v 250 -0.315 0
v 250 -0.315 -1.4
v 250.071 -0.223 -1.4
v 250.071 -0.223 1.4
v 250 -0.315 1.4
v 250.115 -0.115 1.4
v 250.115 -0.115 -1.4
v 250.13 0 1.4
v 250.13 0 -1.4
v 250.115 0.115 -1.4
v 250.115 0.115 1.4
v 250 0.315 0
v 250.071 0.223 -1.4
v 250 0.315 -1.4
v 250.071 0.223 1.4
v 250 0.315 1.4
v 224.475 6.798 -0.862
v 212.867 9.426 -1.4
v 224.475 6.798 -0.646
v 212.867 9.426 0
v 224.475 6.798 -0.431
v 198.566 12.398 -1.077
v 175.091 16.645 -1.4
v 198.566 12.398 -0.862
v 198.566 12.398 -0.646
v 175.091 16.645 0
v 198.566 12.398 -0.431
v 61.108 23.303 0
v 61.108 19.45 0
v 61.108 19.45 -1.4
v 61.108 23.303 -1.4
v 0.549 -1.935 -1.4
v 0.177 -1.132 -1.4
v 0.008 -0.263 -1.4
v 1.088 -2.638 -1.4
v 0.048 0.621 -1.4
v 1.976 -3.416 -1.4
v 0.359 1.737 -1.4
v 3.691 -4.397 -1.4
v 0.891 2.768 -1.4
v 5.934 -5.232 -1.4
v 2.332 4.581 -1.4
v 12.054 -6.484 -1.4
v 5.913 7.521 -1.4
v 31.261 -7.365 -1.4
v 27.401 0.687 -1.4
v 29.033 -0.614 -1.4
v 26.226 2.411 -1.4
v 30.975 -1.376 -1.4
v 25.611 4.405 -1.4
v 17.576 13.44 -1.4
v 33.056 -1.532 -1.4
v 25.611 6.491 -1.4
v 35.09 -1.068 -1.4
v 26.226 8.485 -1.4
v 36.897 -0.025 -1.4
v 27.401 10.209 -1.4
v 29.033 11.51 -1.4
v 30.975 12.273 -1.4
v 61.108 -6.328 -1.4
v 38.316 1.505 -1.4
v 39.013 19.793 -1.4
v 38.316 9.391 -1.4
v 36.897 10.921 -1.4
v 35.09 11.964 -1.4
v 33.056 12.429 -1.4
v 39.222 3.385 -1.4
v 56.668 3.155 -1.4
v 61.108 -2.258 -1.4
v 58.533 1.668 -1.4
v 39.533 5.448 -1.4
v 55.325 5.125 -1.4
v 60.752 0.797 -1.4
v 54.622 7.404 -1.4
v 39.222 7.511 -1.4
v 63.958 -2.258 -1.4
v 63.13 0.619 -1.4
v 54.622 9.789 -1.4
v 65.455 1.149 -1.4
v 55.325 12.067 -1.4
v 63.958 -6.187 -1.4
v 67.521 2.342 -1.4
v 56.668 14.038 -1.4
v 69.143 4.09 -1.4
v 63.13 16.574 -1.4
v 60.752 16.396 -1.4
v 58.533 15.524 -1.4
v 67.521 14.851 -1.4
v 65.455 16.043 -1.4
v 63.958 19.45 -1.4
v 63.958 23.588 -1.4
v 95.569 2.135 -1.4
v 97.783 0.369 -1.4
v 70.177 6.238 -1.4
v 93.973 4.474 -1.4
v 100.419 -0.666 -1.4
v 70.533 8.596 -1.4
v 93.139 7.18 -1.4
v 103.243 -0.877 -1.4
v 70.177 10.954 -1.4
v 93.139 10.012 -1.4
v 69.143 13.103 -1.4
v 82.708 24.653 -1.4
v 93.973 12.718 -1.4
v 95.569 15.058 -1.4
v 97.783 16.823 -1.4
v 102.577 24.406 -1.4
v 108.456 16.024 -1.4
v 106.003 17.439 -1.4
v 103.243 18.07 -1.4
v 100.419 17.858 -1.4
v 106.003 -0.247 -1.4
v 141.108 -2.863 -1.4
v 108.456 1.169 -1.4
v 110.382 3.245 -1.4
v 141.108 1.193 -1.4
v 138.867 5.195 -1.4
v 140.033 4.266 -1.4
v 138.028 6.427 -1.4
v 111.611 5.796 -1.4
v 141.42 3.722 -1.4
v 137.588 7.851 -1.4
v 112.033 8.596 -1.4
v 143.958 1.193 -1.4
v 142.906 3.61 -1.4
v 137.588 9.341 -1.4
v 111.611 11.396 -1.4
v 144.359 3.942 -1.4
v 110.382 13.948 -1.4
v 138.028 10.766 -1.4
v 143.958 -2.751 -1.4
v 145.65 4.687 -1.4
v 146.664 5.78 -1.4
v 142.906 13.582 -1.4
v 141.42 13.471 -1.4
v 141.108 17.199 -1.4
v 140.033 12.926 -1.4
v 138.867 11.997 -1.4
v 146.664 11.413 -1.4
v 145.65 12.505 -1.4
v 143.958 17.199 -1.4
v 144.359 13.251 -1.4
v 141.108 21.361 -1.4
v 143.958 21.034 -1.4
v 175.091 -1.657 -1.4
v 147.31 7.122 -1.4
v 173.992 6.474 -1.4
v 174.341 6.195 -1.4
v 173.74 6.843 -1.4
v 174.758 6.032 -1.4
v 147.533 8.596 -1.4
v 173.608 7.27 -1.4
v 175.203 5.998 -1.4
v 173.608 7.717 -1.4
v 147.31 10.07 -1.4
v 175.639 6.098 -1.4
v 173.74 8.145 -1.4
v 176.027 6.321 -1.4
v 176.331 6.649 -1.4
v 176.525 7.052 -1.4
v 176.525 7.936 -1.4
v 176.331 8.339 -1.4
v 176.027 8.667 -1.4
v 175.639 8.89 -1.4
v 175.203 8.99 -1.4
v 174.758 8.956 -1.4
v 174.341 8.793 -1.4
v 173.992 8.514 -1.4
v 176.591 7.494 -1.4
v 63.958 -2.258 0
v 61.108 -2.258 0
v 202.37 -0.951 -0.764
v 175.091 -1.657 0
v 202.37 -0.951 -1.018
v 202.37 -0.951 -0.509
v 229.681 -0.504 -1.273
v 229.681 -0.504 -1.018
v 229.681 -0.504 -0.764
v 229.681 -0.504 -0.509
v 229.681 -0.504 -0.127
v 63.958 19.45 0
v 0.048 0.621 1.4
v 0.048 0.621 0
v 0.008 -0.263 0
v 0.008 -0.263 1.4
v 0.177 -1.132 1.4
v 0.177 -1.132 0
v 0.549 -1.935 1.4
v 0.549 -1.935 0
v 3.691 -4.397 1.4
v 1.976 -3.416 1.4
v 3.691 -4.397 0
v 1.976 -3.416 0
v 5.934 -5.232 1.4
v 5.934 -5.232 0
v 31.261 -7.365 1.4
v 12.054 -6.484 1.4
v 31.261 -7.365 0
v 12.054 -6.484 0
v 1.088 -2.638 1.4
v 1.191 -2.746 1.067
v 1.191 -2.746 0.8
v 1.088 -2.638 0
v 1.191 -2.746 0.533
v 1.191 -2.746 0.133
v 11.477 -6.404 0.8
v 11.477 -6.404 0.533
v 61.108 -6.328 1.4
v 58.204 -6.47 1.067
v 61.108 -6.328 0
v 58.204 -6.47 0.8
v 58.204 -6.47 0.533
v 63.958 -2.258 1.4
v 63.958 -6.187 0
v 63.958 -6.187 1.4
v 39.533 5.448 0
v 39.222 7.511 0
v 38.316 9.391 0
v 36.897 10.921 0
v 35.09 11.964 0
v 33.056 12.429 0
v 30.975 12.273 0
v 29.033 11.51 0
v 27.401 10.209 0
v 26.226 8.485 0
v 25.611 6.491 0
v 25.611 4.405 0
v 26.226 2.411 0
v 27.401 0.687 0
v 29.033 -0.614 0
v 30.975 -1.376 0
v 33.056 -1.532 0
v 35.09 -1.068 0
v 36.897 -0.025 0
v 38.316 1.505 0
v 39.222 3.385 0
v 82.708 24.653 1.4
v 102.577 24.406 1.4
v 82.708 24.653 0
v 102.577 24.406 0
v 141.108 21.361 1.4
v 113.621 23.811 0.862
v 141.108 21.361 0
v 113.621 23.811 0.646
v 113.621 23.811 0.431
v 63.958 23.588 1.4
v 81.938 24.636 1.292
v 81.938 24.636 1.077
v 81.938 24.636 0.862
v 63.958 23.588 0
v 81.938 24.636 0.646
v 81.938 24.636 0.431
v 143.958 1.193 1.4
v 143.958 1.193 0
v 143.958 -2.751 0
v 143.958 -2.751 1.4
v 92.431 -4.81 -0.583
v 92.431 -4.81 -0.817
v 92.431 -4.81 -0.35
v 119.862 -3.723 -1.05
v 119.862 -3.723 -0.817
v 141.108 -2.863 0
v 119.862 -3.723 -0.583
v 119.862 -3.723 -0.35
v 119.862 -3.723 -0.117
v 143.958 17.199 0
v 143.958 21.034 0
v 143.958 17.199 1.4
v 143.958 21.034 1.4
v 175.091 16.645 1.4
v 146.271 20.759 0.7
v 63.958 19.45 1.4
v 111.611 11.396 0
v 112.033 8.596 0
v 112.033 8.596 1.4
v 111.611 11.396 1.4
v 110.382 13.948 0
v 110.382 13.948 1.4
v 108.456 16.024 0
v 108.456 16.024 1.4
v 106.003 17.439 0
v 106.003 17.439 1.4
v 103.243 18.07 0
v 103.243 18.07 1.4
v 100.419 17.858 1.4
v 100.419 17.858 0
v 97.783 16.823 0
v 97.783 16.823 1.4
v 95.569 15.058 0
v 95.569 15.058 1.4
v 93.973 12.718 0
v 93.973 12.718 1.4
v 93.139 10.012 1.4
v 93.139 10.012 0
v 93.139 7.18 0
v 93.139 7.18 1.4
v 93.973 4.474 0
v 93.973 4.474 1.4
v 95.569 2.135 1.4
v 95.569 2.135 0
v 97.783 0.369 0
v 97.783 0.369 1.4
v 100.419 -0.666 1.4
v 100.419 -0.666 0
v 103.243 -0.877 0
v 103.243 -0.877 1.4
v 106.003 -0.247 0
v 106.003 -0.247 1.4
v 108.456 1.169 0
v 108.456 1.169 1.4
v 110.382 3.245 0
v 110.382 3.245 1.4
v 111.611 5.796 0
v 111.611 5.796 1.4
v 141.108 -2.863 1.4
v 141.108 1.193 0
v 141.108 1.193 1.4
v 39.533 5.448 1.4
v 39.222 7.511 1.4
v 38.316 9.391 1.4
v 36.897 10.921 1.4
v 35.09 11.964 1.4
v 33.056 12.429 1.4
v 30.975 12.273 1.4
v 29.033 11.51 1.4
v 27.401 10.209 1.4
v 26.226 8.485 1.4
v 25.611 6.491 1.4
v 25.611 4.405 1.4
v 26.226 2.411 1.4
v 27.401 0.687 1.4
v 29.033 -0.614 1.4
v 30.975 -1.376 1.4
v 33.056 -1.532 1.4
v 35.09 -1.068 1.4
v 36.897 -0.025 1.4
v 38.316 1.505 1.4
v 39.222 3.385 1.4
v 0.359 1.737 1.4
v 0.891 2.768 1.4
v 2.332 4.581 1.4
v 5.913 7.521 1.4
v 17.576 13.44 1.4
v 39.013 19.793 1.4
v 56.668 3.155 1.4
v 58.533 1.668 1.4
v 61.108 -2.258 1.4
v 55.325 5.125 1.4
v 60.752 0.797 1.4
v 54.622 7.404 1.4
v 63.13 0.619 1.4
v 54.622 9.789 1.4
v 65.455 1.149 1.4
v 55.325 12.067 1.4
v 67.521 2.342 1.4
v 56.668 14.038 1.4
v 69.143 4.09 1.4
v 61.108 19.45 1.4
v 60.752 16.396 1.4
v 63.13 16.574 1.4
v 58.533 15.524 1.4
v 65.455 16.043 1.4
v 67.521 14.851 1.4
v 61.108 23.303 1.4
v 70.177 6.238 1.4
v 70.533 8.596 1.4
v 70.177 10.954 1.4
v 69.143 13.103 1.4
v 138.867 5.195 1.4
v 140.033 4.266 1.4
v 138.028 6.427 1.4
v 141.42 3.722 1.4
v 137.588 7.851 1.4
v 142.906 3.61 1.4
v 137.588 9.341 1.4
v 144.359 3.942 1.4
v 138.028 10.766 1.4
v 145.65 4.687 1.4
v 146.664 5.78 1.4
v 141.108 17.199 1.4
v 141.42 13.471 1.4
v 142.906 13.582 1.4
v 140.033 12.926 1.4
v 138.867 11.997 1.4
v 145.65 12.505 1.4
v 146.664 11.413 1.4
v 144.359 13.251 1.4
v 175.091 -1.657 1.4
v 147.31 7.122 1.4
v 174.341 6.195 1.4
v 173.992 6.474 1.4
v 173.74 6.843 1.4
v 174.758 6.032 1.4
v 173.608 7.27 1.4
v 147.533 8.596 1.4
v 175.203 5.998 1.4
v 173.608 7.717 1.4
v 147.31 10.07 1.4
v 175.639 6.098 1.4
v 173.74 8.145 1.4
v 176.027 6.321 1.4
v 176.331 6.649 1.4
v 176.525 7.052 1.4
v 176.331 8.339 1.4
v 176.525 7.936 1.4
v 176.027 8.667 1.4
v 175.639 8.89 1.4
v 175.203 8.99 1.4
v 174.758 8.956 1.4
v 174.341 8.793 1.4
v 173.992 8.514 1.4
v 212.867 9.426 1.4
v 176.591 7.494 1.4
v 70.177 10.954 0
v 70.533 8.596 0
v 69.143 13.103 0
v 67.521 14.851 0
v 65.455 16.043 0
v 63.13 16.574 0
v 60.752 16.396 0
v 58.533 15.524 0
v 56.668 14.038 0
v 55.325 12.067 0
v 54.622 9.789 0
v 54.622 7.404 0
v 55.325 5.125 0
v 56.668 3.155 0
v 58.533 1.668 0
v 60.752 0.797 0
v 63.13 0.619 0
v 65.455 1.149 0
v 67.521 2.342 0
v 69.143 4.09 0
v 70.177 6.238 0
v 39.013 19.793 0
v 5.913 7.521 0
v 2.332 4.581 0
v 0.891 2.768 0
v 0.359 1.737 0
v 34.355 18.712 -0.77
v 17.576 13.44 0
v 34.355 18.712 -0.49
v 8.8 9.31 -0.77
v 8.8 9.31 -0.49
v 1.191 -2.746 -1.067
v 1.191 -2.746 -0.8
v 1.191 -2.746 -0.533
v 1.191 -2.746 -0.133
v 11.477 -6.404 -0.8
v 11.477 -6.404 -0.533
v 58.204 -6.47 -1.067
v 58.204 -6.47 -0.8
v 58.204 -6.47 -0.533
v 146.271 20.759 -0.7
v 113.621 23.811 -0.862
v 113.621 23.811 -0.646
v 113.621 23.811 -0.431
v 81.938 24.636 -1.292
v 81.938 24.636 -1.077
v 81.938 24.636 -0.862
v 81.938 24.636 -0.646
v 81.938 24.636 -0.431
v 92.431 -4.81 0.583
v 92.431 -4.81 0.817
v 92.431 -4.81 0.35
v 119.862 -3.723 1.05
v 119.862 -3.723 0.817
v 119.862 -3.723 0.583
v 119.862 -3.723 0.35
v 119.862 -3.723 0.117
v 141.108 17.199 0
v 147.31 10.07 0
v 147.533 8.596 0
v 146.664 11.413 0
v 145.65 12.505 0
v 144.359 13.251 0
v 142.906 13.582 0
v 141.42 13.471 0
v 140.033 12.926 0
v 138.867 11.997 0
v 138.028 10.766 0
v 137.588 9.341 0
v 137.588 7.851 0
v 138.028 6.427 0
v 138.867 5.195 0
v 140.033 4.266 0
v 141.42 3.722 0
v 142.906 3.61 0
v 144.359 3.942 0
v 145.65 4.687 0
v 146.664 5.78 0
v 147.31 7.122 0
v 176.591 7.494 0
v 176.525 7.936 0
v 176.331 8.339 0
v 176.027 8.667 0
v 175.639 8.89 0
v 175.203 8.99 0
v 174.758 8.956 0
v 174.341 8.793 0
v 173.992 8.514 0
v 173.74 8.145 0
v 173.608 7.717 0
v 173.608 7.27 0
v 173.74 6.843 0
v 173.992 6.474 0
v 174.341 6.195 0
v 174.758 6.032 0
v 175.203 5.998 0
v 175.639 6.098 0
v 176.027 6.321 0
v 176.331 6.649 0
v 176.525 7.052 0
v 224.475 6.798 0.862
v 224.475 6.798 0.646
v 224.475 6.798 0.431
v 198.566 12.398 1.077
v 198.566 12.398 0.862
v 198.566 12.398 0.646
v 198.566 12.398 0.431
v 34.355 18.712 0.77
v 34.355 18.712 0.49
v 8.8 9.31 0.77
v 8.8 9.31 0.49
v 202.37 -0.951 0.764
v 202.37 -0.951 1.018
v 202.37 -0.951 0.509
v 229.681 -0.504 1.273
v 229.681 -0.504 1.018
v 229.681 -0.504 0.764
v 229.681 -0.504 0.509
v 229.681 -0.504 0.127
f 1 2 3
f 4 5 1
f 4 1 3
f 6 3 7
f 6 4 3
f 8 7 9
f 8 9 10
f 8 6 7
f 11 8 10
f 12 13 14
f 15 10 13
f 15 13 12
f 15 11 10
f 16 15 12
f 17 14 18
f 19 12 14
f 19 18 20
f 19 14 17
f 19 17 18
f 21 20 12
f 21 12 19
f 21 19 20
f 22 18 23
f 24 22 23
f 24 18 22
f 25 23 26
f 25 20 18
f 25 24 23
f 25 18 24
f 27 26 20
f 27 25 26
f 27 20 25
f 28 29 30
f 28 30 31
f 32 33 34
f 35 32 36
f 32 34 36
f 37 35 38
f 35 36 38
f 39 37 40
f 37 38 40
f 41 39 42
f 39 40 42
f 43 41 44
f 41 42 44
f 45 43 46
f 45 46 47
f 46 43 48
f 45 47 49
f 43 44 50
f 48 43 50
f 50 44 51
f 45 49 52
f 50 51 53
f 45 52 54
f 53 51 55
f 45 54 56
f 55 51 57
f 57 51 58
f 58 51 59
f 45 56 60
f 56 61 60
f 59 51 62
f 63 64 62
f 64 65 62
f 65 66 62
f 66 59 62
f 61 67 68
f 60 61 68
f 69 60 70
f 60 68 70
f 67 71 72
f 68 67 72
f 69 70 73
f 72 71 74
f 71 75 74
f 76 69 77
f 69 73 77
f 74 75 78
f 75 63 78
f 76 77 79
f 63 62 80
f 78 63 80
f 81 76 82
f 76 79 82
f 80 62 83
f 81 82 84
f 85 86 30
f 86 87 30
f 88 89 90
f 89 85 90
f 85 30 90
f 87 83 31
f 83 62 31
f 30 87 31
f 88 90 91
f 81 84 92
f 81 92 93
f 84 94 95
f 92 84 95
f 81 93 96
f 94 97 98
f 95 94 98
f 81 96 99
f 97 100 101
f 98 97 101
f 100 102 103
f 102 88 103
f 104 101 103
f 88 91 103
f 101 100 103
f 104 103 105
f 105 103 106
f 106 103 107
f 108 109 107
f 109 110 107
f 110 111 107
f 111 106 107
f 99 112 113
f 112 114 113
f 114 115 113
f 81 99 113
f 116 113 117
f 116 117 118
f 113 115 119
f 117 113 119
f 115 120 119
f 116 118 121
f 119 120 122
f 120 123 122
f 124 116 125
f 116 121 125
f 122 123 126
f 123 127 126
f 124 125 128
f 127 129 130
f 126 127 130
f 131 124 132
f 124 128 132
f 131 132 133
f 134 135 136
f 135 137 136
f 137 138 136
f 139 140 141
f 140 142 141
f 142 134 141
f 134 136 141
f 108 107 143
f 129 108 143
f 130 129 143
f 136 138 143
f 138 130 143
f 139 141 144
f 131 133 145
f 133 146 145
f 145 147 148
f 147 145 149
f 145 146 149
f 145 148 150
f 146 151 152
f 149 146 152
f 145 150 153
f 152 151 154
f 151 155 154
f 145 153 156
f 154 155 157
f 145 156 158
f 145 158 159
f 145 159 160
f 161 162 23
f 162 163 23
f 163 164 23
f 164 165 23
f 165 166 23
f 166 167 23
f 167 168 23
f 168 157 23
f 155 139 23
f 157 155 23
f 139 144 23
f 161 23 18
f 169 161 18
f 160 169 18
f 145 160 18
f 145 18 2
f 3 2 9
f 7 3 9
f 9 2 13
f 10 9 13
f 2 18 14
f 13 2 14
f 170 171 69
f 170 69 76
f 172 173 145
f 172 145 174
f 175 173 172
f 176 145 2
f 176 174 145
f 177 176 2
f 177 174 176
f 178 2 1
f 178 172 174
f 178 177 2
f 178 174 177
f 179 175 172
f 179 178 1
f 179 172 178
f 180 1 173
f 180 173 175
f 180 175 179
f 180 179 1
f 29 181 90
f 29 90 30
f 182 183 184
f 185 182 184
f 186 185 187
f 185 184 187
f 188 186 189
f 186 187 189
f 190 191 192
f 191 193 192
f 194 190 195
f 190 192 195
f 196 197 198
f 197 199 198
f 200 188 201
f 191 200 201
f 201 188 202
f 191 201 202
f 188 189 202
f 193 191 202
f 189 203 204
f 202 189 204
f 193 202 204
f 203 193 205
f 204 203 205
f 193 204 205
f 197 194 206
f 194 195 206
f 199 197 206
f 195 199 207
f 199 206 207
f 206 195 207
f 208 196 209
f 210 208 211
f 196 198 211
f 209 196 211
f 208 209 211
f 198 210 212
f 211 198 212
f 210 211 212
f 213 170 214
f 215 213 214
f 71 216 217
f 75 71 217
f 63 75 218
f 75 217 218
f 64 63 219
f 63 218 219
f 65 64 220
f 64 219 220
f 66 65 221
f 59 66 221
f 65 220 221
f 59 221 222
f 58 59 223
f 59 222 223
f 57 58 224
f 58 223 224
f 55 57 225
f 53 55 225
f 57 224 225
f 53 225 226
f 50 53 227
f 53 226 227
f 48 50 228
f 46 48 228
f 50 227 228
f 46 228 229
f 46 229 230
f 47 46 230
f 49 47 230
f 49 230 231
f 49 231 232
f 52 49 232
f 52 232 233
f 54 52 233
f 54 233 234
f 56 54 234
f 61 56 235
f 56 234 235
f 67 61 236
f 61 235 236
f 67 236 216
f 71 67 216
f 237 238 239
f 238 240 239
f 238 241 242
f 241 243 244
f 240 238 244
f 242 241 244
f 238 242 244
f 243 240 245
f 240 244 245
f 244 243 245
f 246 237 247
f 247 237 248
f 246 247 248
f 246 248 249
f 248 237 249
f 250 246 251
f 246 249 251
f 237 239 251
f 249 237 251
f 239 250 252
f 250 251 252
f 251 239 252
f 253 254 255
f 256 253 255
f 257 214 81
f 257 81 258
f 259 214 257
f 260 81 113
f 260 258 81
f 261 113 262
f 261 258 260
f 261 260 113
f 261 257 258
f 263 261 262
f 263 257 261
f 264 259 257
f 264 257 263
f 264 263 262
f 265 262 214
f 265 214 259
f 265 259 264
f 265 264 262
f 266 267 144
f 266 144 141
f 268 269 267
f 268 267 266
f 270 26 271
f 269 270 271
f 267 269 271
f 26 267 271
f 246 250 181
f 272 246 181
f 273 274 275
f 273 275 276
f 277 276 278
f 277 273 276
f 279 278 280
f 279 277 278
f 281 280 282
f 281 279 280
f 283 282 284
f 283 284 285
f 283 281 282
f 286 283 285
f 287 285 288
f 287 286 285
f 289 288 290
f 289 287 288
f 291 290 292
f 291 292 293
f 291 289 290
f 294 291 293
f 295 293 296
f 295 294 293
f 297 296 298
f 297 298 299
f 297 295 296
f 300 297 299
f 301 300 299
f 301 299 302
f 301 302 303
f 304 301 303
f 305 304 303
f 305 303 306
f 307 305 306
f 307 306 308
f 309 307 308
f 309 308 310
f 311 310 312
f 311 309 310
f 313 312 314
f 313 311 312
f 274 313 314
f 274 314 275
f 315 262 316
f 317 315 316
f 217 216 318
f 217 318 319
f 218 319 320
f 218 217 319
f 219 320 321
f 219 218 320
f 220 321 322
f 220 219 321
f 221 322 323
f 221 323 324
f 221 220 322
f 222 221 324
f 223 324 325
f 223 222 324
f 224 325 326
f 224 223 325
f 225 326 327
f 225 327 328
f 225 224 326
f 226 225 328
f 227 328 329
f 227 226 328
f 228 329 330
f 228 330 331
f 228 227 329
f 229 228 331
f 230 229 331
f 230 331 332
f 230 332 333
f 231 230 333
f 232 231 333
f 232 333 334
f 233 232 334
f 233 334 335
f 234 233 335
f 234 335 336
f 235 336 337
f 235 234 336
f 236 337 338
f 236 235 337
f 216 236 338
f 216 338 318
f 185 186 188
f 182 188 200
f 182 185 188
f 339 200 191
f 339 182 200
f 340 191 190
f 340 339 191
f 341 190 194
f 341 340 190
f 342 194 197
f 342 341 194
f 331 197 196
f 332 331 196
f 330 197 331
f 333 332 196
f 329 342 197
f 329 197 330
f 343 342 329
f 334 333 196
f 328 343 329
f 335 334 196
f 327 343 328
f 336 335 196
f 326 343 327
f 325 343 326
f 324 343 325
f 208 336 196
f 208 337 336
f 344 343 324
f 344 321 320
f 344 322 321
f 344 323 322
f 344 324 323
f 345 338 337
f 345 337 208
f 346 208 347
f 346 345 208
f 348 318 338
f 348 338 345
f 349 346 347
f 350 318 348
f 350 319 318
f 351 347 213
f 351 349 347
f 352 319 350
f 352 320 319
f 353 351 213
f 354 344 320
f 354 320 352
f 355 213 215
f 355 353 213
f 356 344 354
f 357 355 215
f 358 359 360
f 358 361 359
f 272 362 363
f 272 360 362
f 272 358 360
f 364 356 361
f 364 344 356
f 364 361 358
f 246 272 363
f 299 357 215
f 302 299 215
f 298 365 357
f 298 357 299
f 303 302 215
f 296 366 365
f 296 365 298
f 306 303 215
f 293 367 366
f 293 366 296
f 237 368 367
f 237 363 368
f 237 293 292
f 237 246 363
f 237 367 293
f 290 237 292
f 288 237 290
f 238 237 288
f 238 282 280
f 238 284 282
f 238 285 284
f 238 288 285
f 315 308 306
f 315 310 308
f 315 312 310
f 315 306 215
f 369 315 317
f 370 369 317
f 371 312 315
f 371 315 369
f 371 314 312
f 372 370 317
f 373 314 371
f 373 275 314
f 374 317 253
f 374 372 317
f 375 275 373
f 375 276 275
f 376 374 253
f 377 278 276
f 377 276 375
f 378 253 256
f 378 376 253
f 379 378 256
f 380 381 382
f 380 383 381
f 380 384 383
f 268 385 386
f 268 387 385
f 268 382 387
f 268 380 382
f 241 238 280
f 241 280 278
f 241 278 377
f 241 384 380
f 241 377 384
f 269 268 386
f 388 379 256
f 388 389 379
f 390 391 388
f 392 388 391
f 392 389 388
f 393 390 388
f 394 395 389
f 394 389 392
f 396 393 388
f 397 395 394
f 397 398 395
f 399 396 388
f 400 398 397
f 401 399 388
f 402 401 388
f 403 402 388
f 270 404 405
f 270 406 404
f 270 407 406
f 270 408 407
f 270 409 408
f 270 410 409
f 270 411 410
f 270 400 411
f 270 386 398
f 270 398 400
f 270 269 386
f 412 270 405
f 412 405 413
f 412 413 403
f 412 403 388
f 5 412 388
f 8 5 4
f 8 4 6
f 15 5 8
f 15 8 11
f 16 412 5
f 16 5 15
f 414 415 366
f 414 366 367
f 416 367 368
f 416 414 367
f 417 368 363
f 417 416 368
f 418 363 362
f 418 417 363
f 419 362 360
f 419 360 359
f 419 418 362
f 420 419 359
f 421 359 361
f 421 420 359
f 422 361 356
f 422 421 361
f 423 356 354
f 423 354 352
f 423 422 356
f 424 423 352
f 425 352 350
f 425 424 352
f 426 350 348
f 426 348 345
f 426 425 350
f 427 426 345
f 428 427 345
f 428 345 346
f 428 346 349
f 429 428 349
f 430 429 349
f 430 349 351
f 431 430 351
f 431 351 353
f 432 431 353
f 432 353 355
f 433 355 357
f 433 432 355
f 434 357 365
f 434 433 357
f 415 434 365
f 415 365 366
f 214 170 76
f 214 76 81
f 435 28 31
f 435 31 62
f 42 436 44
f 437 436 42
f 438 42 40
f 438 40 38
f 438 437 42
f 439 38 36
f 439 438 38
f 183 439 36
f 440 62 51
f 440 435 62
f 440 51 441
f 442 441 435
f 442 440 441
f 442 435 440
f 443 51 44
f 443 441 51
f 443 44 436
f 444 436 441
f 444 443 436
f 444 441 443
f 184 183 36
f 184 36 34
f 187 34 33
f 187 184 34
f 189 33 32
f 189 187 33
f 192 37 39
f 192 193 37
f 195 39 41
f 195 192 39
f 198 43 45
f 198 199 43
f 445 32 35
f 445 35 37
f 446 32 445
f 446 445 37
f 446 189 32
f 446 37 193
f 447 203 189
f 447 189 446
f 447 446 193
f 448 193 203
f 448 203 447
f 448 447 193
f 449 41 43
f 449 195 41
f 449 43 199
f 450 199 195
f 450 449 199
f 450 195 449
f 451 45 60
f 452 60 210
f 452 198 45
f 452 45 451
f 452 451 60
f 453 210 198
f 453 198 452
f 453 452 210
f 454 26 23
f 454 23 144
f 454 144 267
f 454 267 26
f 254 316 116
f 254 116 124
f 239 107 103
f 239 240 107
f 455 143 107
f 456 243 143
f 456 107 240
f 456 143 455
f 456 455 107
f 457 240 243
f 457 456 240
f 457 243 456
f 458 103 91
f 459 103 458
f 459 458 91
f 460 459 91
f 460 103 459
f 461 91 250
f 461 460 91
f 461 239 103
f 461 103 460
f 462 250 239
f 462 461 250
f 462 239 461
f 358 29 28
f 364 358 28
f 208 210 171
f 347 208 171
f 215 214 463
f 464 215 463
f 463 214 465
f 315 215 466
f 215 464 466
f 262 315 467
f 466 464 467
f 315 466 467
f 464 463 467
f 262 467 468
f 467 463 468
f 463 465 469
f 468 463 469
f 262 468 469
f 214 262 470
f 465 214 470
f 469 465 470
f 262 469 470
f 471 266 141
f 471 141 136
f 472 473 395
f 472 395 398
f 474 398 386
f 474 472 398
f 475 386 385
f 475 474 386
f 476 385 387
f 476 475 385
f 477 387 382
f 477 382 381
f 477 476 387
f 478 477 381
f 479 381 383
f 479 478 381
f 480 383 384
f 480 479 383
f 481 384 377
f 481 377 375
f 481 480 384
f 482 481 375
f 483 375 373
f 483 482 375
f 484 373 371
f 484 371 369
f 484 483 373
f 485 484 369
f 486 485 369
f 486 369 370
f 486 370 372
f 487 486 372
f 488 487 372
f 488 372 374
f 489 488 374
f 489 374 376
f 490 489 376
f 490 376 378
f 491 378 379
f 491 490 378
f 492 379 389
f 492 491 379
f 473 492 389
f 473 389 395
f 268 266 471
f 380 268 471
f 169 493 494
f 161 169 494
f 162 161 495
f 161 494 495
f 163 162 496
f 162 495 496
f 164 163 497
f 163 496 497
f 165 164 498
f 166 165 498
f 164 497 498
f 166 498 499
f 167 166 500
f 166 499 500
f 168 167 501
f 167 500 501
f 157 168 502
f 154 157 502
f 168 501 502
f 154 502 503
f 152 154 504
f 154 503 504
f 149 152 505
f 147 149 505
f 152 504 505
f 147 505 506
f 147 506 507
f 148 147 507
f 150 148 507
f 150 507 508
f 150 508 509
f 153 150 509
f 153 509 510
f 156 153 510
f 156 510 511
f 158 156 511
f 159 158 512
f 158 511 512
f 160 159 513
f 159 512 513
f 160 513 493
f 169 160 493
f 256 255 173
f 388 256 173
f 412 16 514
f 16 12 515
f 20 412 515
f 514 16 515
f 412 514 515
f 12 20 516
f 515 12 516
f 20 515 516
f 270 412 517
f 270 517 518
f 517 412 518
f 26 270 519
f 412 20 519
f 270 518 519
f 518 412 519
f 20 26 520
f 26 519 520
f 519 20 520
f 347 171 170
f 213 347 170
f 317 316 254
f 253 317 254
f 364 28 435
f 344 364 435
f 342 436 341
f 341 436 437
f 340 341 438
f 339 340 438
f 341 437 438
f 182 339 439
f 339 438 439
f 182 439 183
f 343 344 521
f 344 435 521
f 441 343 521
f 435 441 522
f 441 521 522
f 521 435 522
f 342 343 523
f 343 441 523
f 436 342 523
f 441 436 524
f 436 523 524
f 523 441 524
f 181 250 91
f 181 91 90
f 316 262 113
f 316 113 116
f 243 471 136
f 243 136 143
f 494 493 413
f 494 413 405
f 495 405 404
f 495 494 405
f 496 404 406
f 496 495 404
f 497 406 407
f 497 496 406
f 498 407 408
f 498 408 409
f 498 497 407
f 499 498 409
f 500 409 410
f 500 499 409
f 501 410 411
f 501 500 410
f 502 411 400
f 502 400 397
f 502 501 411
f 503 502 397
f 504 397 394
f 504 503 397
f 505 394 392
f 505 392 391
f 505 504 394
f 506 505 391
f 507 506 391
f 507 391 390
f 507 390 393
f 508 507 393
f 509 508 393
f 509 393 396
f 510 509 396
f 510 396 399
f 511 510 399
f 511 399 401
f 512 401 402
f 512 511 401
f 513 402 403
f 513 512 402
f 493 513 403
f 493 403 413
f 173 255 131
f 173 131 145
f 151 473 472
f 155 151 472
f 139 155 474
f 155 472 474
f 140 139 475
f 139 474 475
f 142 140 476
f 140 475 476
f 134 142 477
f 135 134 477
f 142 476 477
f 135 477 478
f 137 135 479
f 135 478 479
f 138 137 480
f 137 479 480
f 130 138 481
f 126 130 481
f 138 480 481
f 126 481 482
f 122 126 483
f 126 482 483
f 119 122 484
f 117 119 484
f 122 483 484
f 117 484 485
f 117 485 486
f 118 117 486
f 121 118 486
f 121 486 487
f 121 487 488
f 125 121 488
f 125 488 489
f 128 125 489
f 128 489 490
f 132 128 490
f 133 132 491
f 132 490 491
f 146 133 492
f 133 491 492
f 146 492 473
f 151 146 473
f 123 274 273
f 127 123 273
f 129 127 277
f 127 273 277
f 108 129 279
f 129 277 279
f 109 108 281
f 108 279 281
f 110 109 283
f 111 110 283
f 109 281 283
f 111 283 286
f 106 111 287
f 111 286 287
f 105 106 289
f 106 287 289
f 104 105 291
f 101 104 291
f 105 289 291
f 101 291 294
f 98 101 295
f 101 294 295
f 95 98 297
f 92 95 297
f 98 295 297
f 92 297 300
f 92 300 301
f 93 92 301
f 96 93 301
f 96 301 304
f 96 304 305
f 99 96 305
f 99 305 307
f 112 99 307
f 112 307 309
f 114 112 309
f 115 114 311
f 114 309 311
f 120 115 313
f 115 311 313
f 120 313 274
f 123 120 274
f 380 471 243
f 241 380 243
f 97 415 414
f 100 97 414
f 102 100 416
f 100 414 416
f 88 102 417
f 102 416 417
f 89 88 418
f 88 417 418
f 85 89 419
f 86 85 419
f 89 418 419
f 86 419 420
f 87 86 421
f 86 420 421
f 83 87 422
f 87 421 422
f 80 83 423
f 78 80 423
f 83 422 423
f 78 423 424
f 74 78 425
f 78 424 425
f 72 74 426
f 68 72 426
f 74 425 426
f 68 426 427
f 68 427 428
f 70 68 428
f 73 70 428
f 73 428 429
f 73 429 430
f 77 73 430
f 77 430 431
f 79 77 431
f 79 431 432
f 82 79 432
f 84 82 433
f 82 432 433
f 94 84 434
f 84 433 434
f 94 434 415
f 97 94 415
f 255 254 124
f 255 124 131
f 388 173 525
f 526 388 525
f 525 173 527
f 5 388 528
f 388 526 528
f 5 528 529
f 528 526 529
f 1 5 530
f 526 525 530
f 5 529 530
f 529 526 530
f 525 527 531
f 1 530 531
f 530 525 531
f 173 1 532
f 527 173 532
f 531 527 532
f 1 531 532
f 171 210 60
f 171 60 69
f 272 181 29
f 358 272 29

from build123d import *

# Parameters (mm, degrees)
SKETCH_1_R      = 7
SKETCH_1_R_2    = 8
SKETCH_1_R_3    = 9.5
SKETCH_1_R_4    = 5
SKETCH_1_R_5    = 1.5
EXTRUDE_1_DEPTH = 1.4


with BuildPart() as part:
    # Эскиз1 → Бобышка-Вытянуть1 (new, symmetric)
    # profile 1 of 2: a face of its own
    with BuildSketch(Plane.XY):
        with BuildLine():
            Line((63.957619318, 19.450139662), (61.107619318, 19.450139662))
            Line((61.107619318, 19.450139662), (61.107619318, 23.303137173))
            add(Edge.make_bspline(
                [(61.107619318, 23.303137173), (59.917945614, 23.176751945), (56.739740439, 22.81448979), (51.605762688, 22.119065522), (45.744400311, 21.156564432), (39.995857594, 20.03537139), (34.397919842, 18.756316235), (29.010382103, 17.327615608), (23.925798408, 15.771864922), (19.27067884, 14.134269435), (15.179098391, 12.483335438), (11.74047579, 10.895610996), (8.959371869, 9.429577366), (6.76089118, 8.1086032), (5.033709748, 6.924638056), (3.671694933, 5.854229665), (2.592101123, 4.871305369), (1.738175668, 3.952595744), (1.06987083, 3.080946374), (0.57164541, 2.241622103), (0.215773899, 1.430785398), (0.102255581, 0.883241695), (0.047975, 0.621425001)],
                knots=[0.740090669, 0.740090669, 0.740090669, 0.740090669, 0.7539832, 0.77723469, 0.800246382, 0.822950709, 0.845237155, 0.866915896, 0.887662335, 0.906968281, 0.924203157, 0.938878975, 0.950931611, 0.960693484, 0.968646729, 0.975232933, 0.980794744, 0.985583761, 0.989781539, 0.993521313, 0.996902113, 1, 1, 1, 1], degree=3))
            add(Edge.make_bspline(
                [(0.047975, 0.621425001), (0.02271382, 0.373490086), (-0.027820789, -0.122499974), (0.077991212, -0.884434589), (0.34969565, -1.63883807), (0.814331135, -2.365068923), (1.46348078, -3.039275244), (2.290973016, -3.660999469), (3.30592875, -4.23577962), (4.535255619, -4.773674143), (6.029745688, -5.282192164), (7.868981215, -5.765316676), (10.168831391, -6.221716592), (13.075438188, -6.63961873), (16.728115362, -6.992956737), (21.189952096, -7.247345144), (26.399984415, -7.376638848), (32.197398564, -7.376256913), (38.397806759, -7.261436579), (44.857621768, -7.056641358), (51.486543096, -6.786453532), (56.920566709, -6.533358441), (60.139839208, -6.376114839), (61.107619318, -6.32836923)],
                knots=[0, 0, 0, 0, 0.002941446, 0.005884319, 0.00901613, 0.012364547, 0.016007934, 0.020036845, 0.024573728, 0.029783835, 0.03589701, 0.04324044, 0.052275965, 0.063634589, 0.077983176, 0.095698161, 0.116520086, 0.13966073, 0.16431217, 0.18991889, 0.216157201, 0.242837762, 0.254306514, 0.254306514, 0.254306514, 0.254306514], degree=3))
            Line((61.107619318, -6.32836923), (61.107619318, -2.257745247))
            Line((61.107619318, -2.257745247), (63.957619318, -2.257745247))
            Line((63.957619318, -2.257745247), (63.957619318, -6.186566126))
            add(Edge.make_bspline(
                [(63.957619318, -6.186566126), (64.317823095, -6.168514758), (66.969747676, -6.035316313), (71.910772709, -5.784005174), (78.771375576, -5.439680449), (85.610498609, -5.110951246), (92.432107589, -4.804953317), (99.25503119, -4.531981644), (106.097378404, -4.278274658), (112.96921168, -4.00308991), (119.864404254, -3.723176166), (126.773860473, -3.440067276), (133.855552455, -3.151608468), (138.633361552, -2.960411351), (141.107619318, -2.86287629)],
                knots=[0.265564796, 0.265564796, 0.265564796, 0.265564796, 0.269833583, 0.296993022, 0.324123272, 0.351139107, 0.378035509, 0.404946016, 0.431960837, 0.459078395, 0.4863474, 0.51364083, 0.540928595, 0.570237104, 0.570237104, 0.570237104, 0.570237104], degree=3))
            Line((141.107619318, -2.86287629), (141.107619318, 1.193130543))
            Line((141.107619318, 1.193130543), (143.957619318, 1.193130543))
            Line((143.957619318, 1.193130543), (143.957619318, -2.751209627))
            add(Edge.make_bspline(
                [(143.957619318, -2.751209627), (145.13020609, -2.705557458), (148.596084852, -2.571725453), (154.352602411, -2.355626415), (161.225044134, -2.109369921), (168.090869746, -1.876634074), (172.712313278, -1.729793129), (175.045239361, -1.65837681), (175.091334091, -1.656966802)],
                knots=[0.581490104, 0.581490104, 0.581490104, 0.581490104, 0.595379569, 0.622543445, 0.64967326, 0.676775201, 0.703855228, 0.704401069, 0.704401069, 0.704401069, 0.704401069], degree=3))
            ThreePointArc((175.091334091, -1.656966802), (165.940456932, 7.493910357), (175.091334091, 16.644787515))
            add(Edge.make_bspline(
                [(175.091334091, 16.644787515), (174.212389388, 16.789012775), (171.154404183, 17.284960287), (165.914317095, 18.099827841), (159.368680729, 19.054501815), (152.821805128, 19.944885603), (147.683892721, 20.591912914), (144.728786809, 20.943344409), (143.957619318, 21.033629847)],
                knots=[0.296903142, 0.296903142, 0.296903142, 0.296903142, 0.30724642, 0.332878042, 0.358484538, 0.384061186, 0.409602822, 0.418619192, 0.418619192, 0.418619192, 0.418619192], degree=3))
            Line((143.957619318, 21.033629847), (143.957619318, 17.19883932))
            Line((143.957619318, 17.19883932), (141.107619318, 17.19883932))
            Line((141.107619318, 17.19883932), (141.107619318, 21.360787161))
            add(Edge.make_bspline(
                [(141.107619318, 21.360787161), (140.647203073, 21.412583326), (138.008124909, 21.706530989), (133.19183673, 22.212004255), (126.658683026, 22.825721434), (120.136770918, 23.363973271), (113.62856714, 23.824677329), (107.152732037, 24.200242598), (100.741095693, 24.498399513), (94.411752715, 24.686649771), (88.155917993, 24.740095652), (81.949043055, 24.658849145), (75.780520591, 24.441013809), (69.785413798, 24.089605746), (65.850842722, 23.766532071), (63.957619318, 23.588464287)],
                knots=[0.429723551, 0.429723551, 0.429723551, 0.429723551, 0.435103874, 0.460559416, 0.485959195, 0.51130307, 0.536551515, 0.561723366, 0.586628867, 0.611085431, 0.6352512, 0.659272176, 0.683163753, 0.706922144, 0.729003809, 0.729003809, 0.729003809, 0.729003809], degree=3))
            Line((63.957619318, 23.588464287), (63.957619318, 19.450139662))
        make_face()
        with Locations((32.532619318, 5.448144701)):
            Circle(SKETCH_1_R, mode=Mode.SUBTRACT)
        with Locations((62.532619318, 8.596197208)):
            Circle(SKETCH_1_R_2, mode=Mode.SUBTRACT)
        with Locations((102.532619318, 8.596197208)):
            Circle(SKETCH_1_R_3, mode=Mode.SUBTRACT)
        with Locations((142.532619318, 8.596197208)):
            Circle(SKETCH_1_R_4, mode=Mode.SUBTRACT)
    # profile 2 of 2: a face of its own
    with BuildSketch(Plane.XY):
        with BuildLine():
            add(Edge.make_bspline(
                [(250, 0.315), (249.15566774, 0.545019818), (246.720175698, 1.208516243), (242.391332083, 2.358339053), (236.849761204, 3.787625364), (230.779918279, 5.298008837), (224.455917947, 6.812866028), (218.030543496, 8.291610632), (211.562405045, 9.719735057), (205.072411509, 11.092374932), (198.567970913, 12.407850726), (192.052369914, 13.665297924), (185.527619973, 14.864093303), (179.872800983, 15.850364437), (176.392239334, 16.431323122), (175.091334091, 16.644787515)],
                knots=[0, 0, 0, 0, 0.0101622, 0.029313053, 0.052011605, 0.076619468, 0.101948061, 0.127526132, 0.153184131, 0.178867888, 0.204557903, 0.230245712, 0.255925967, 0.281594302, 0.296903142, 0.296903142, 0.296903142, 0.296903142], degree=3))
            ThreePointArc((175.091334091, 16.644787515), (165.940456932, 7.493910357), (175.091334091, -1.656966802))
            add(Edge.make_bspline(
                [(175.091334091, -1.656966802), (177.330680613, -1.588466601), (181.854695323, -1.455127256), (188.663234462, -1.270383377), (195.516645168, -1.101112884), (202.369532894, -0.948617189), (211.49919029, -0.767742353), (220.603098666, -0.619939742), (229.617630172, -0.50292618), (236.087353854, -0.431514192), (241.980776913, -0.376520461), (246.558970011, -0.339535886), (249.120490965, -0.321271242), (250, -0.315)],
                knots=[0.704401069, 0.704401069, 0.704401069, 0.704401069, 0.730918775, 0.757971338, 0.785017763, 0.812061651, 0.839103366, 0.893099152, 0.919831065, 0.945809917, 0.969680601, 0.989589706, 1, 1, 1, 1], degree=3))
            ThreePointArc((250, -0.315), (250.130477272, 0), (250, 0.315))
        make_face()
        with Locations((175.091334091, 7.493910357)):
            Circle(SKETCH_1_R_5, mode=Mode.SUBTRACT)
    extrude(amount=EXTRUDE_1_DEPTH, both=True)


solid = part.part
